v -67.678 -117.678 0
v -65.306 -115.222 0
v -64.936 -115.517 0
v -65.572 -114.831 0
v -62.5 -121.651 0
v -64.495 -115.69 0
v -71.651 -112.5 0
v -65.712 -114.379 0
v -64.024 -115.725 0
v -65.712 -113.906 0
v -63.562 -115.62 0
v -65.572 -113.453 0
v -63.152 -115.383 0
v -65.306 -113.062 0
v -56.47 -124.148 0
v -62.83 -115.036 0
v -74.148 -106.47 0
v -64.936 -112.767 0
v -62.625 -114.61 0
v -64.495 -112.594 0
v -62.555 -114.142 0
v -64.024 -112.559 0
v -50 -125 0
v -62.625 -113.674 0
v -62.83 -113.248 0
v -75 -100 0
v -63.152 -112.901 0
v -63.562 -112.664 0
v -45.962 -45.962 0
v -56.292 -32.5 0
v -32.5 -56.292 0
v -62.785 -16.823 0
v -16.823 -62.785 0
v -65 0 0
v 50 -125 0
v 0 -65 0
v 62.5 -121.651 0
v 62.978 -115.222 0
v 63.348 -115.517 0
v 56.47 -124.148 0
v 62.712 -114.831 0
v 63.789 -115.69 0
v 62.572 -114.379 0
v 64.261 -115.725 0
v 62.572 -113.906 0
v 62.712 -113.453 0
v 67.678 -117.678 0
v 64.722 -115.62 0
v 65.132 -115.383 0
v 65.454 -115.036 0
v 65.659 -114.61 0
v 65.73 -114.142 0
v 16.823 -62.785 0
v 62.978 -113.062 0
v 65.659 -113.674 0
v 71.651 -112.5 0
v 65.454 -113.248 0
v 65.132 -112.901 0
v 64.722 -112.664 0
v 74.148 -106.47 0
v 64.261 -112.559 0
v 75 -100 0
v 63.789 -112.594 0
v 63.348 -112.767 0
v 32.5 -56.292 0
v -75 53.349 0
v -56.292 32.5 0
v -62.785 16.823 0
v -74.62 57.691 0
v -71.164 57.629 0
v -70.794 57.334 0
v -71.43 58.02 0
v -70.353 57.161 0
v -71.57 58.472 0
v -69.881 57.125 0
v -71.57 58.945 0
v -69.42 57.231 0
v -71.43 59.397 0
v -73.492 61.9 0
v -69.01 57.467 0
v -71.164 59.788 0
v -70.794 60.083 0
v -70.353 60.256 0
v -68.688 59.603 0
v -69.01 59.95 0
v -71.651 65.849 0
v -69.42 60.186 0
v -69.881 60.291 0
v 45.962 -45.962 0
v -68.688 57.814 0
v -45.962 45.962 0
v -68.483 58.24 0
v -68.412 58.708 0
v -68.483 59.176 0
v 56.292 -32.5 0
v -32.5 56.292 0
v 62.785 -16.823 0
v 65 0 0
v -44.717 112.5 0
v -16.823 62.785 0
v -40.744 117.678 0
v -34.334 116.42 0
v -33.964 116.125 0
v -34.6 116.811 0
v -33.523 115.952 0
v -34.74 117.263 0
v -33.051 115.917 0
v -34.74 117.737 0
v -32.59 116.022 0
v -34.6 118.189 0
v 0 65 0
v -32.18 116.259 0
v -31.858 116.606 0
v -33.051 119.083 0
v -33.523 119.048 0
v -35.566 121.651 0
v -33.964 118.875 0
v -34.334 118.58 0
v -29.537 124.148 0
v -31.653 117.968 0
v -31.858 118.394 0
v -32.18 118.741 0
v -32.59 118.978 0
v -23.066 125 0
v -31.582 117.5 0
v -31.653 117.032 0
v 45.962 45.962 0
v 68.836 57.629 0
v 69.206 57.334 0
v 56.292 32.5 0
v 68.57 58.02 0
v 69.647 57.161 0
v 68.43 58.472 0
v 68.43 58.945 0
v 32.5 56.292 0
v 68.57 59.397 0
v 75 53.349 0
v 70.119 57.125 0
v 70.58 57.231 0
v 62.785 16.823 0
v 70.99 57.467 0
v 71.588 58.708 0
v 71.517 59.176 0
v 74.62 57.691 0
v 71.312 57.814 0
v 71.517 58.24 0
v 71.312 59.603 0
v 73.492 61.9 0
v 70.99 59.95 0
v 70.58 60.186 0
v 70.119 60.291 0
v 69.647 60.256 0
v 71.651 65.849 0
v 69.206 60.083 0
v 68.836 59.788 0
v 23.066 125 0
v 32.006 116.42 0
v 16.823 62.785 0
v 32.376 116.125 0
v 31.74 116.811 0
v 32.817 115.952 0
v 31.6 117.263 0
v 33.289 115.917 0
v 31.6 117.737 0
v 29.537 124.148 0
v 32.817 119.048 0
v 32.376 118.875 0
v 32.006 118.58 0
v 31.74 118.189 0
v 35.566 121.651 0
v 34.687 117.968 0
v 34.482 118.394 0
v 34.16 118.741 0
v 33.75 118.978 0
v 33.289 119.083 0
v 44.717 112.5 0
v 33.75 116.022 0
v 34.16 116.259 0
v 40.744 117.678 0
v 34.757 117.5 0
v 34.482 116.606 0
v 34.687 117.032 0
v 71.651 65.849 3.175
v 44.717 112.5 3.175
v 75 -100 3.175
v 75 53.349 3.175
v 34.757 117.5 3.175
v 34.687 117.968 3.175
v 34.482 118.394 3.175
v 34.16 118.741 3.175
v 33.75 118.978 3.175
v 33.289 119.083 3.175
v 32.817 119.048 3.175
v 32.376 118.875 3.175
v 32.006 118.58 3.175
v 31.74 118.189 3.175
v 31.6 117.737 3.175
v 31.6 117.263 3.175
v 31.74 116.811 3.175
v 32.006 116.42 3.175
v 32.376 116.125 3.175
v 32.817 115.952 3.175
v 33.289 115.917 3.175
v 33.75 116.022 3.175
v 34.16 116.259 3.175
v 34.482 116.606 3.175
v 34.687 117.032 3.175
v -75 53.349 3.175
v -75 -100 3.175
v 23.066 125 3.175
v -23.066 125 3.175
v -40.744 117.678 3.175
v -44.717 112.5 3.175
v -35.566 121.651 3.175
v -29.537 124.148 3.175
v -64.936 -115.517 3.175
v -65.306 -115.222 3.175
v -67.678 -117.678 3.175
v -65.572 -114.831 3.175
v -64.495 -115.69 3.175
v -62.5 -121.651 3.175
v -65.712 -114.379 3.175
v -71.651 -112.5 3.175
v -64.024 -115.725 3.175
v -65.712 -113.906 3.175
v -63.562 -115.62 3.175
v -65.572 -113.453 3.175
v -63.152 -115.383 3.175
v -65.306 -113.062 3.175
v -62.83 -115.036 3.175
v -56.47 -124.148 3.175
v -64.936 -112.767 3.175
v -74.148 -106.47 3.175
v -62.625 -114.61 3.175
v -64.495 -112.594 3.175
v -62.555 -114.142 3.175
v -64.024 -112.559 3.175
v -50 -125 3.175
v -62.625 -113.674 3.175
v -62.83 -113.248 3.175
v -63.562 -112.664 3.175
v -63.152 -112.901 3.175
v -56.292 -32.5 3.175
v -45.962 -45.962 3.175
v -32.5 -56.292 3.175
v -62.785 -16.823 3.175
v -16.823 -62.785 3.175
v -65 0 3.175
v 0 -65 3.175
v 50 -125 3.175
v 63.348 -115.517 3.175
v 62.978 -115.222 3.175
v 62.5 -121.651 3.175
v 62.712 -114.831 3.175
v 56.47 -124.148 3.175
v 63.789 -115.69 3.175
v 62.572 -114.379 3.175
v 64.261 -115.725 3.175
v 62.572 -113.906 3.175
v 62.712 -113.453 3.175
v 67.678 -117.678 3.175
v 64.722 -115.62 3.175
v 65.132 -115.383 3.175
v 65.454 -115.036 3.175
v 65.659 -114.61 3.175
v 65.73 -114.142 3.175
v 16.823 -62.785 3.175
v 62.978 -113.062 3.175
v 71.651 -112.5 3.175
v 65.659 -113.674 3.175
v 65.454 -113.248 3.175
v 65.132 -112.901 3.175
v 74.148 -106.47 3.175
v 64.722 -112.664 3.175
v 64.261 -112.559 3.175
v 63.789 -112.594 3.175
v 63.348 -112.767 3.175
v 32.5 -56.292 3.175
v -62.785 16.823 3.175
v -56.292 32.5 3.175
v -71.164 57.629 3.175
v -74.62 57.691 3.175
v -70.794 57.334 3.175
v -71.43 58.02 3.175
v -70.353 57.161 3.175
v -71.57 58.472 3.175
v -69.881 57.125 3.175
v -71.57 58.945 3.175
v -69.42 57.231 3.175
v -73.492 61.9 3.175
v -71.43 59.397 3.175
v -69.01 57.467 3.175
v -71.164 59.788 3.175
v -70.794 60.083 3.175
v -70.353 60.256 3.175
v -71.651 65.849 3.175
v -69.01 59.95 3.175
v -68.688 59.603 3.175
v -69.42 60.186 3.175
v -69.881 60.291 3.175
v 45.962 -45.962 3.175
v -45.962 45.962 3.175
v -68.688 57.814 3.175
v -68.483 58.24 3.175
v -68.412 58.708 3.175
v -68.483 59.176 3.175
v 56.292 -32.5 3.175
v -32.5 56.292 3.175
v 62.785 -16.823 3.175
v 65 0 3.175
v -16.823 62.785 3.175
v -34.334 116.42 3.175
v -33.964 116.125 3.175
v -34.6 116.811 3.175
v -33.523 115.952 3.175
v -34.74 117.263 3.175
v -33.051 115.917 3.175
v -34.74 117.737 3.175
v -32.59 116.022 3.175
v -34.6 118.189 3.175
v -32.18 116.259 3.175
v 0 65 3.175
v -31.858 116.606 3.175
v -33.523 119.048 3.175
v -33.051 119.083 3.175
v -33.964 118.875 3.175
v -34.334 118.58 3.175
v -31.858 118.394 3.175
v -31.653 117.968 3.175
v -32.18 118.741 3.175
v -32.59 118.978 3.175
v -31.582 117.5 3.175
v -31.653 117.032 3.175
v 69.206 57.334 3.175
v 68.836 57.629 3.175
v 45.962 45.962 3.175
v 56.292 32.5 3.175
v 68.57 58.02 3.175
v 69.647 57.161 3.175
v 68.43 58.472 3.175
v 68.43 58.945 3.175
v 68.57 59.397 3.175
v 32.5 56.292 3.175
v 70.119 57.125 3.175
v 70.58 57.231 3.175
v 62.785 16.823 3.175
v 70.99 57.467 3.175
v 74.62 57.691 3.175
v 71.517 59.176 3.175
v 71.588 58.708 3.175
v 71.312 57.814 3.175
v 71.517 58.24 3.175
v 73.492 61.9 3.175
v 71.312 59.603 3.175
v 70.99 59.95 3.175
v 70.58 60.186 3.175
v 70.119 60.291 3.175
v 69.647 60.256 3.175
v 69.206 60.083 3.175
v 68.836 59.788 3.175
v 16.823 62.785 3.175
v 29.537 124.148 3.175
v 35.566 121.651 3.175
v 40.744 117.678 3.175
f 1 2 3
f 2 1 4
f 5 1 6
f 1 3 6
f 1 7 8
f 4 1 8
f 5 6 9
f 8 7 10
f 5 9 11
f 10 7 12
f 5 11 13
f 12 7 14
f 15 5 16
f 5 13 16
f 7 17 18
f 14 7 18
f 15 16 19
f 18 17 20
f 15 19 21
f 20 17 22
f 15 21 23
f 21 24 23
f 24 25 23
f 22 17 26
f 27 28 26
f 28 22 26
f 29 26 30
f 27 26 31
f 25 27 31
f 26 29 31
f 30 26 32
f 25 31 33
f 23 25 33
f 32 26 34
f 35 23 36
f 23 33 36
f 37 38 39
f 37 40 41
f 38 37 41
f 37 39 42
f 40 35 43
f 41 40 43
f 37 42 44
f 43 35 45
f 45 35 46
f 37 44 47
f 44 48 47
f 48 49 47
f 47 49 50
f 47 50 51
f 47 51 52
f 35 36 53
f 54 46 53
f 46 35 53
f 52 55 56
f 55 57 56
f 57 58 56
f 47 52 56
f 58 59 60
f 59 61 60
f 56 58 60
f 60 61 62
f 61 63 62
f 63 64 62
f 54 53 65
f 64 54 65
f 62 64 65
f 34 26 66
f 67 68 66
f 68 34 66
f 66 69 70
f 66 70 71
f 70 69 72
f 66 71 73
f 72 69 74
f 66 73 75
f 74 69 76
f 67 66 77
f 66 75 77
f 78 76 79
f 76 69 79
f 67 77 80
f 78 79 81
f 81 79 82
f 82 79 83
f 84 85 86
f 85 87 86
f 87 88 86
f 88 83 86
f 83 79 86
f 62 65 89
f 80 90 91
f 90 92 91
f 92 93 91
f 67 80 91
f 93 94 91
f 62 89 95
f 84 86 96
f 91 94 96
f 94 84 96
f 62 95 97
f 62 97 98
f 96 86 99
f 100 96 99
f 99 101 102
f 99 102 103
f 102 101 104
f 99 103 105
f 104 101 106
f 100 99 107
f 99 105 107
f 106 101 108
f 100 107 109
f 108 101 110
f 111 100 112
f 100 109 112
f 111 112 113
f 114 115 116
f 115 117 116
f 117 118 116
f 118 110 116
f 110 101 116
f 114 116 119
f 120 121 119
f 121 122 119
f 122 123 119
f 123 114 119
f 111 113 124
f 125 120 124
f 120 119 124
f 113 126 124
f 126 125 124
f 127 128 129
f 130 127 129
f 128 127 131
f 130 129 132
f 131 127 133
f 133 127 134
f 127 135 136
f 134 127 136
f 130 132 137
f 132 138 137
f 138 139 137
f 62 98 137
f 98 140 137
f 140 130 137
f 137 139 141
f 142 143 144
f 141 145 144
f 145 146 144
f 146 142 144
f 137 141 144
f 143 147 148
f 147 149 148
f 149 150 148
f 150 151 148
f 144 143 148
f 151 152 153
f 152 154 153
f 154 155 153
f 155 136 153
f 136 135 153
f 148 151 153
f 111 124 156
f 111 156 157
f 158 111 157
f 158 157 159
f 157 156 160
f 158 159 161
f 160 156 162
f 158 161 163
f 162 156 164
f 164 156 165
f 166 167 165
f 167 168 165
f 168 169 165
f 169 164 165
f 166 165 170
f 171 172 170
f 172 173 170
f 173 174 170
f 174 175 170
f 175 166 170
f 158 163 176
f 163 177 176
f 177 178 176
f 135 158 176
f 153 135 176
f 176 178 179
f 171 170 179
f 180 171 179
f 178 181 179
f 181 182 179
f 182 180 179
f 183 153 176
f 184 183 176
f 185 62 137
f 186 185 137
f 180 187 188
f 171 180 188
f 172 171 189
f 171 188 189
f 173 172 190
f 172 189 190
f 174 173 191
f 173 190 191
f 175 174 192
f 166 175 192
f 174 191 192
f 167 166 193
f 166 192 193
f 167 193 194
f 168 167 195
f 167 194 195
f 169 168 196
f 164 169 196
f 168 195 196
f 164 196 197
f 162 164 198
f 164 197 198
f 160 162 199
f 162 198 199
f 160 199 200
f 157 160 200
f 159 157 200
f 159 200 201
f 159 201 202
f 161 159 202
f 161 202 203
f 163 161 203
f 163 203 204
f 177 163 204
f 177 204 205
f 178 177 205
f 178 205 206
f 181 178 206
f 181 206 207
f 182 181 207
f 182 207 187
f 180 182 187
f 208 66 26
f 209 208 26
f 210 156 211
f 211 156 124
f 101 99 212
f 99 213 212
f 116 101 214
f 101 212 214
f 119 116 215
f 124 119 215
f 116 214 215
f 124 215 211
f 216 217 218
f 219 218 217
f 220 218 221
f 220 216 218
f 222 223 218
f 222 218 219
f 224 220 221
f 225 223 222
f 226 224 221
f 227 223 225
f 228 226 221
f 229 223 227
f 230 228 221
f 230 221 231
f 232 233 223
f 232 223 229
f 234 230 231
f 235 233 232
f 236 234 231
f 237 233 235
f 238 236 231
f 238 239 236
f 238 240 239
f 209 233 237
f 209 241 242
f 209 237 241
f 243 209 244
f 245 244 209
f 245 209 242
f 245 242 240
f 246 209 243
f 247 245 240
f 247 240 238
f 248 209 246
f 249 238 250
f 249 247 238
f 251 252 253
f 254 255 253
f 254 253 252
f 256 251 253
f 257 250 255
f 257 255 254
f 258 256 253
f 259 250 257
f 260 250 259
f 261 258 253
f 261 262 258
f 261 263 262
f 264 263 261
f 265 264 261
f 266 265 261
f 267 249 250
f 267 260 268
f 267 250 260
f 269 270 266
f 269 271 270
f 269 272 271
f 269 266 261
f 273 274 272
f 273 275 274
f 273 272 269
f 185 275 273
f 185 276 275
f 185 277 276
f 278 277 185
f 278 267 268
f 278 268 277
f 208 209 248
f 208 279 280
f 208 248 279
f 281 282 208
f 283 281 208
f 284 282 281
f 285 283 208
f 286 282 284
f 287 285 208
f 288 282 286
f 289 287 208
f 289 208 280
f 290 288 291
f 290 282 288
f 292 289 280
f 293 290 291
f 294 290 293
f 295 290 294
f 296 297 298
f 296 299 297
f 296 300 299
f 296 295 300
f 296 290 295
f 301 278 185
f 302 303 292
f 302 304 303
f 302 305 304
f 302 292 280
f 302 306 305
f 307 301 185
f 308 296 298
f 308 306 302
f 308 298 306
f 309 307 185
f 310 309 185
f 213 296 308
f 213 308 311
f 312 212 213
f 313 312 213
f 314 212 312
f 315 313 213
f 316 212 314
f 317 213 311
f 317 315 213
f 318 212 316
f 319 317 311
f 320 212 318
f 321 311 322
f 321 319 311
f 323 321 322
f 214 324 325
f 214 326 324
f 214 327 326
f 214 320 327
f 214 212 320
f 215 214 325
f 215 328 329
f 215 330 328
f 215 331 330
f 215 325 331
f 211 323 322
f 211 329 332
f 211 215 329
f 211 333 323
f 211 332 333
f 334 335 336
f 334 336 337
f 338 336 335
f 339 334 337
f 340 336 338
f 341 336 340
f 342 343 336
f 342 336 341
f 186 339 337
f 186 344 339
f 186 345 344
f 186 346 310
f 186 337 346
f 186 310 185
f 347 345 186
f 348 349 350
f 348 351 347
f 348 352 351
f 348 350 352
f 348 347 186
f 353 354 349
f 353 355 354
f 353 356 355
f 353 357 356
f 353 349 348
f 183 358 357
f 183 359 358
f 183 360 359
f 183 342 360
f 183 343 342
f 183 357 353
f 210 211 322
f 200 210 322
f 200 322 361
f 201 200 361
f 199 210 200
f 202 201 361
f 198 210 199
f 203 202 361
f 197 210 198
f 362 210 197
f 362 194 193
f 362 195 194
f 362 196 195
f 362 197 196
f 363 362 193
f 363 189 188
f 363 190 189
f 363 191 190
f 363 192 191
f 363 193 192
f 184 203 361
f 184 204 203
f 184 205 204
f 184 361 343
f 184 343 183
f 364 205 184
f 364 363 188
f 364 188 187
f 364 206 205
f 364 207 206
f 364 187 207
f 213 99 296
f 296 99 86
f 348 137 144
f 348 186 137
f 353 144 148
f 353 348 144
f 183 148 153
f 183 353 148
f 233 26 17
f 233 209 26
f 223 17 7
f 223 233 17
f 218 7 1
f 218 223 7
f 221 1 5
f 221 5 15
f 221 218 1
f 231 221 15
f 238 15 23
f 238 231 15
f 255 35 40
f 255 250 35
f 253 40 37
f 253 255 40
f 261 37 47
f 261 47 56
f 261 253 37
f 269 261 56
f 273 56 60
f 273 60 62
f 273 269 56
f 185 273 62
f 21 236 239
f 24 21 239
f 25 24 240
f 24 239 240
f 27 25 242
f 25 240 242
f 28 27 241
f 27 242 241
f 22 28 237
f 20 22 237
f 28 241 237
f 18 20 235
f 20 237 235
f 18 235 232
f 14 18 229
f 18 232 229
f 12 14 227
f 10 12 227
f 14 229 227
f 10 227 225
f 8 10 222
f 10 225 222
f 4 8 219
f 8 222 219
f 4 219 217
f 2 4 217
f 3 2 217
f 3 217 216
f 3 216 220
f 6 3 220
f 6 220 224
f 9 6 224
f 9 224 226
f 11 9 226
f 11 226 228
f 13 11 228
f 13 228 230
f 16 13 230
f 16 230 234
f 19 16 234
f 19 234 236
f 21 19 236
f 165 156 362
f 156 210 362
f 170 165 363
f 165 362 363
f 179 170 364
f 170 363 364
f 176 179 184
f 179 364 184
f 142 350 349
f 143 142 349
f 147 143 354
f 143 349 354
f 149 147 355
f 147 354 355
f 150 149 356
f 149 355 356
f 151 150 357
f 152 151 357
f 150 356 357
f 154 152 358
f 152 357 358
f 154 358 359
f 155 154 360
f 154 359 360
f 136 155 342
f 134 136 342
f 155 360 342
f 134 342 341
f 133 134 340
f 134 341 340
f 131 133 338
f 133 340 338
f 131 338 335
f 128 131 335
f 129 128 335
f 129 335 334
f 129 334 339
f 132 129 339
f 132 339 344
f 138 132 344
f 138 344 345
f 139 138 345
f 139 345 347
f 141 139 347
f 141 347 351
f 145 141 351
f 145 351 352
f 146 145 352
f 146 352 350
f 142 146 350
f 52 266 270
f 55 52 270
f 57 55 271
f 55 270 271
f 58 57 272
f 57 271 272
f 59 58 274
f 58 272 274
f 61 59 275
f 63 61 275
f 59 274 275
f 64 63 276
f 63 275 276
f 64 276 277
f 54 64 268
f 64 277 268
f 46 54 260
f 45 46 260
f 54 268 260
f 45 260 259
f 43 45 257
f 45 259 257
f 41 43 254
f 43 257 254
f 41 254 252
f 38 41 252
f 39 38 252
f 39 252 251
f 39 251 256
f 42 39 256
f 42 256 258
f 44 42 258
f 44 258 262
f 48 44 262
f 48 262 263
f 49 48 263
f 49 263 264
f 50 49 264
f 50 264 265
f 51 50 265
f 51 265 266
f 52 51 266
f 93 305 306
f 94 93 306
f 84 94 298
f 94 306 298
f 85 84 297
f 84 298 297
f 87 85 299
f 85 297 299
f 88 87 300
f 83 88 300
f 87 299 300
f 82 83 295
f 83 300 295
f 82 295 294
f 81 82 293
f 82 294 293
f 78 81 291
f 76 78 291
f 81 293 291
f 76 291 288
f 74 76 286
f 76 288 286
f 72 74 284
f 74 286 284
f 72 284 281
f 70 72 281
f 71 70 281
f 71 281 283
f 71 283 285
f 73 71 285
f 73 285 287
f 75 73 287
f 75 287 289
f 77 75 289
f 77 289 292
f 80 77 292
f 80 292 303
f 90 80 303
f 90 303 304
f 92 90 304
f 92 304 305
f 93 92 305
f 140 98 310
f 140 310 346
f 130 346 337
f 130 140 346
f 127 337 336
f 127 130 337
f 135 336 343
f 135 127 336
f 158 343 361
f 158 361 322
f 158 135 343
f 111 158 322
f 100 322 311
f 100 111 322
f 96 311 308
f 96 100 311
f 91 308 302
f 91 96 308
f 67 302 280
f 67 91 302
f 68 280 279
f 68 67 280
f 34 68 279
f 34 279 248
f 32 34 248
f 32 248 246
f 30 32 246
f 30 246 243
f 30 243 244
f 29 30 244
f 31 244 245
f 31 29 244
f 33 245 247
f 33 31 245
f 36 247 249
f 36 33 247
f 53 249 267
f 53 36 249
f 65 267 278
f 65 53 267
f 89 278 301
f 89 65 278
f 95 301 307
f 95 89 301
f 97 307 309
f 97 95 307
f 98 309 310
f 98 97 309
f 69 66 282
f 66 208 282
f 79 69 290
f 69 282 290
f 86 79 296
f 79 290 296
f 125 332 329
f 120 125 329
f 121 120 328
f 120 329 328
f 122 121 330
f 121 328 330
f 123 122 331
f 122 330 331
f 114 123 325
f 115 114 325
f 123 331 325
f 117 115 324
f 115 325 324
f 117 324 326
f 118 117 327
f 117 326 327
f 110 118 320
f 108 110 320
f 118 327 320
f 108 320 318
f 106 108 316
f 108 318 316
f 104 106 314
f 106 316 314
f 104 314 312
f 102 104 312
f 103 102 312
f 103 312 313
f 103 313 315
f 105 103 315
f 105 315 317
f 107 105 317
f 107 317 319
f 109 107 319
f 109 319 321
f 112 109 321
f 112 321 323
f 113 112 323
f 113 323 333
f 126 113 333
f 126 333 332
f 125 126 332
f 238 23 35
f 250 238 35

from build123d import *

# Parameters (mm, degrees)
F0_R     = 65
F1_DEPTH = 3.175
F2_R     = 25
F3_R     = 1.5875
F4_DEPTH = 3.176


with BuildPart() as f1:
    # F0 (on Top) → F1 (new body)
    with BuildSketch(Plane.XY):
        Polygon((-75, 60.048095), (-75, -125), (75, -125), (75, 60.048095), (37.5, 125), (-37.5, 125), align=None)
        Circle(F0_R, mode=Mode.SUBTRACT)
    extrude(amount=F1_DEPTH)

    # F2
    f2_edges = [f1.edges().sort_by_distance(p)[0] for p in [
        (-75, -125, 1.5875),
        (75, -125, 1.5875),
        (-37.5, 125, 1.5875),
        (-75, 60.048095, 1.5875),
        (75, 60.048095, 1.5875),
        (37.5, 125, 1.5875),
    ]]
    fillet(f2_edges, radius=F2_R)

    # F3 (on face) → F4 (cut, through all)
    with BuildSketch(Plane.XY.offset(3.175)):
        with Locations((-33.169873, 117.5)):
            Circle(F3_R)
        with Locations((33.169873, 117.5)):
            Circle(F3_R)
        with Locations((70, 58.708349)):
            Circle(F3_R)
        with Locations((-70, 58.708349)):
            Circle(F3_R)
        with Locations((-64.142136, -114.142136)):
            Circle(F3_R)
        with Locations((64.142136, -114.142136)):
            Circle(F3_R)
    extrude(amount=-F4_DEPTH, mode=Mode.SUBTRACT)


solid = f1.part
